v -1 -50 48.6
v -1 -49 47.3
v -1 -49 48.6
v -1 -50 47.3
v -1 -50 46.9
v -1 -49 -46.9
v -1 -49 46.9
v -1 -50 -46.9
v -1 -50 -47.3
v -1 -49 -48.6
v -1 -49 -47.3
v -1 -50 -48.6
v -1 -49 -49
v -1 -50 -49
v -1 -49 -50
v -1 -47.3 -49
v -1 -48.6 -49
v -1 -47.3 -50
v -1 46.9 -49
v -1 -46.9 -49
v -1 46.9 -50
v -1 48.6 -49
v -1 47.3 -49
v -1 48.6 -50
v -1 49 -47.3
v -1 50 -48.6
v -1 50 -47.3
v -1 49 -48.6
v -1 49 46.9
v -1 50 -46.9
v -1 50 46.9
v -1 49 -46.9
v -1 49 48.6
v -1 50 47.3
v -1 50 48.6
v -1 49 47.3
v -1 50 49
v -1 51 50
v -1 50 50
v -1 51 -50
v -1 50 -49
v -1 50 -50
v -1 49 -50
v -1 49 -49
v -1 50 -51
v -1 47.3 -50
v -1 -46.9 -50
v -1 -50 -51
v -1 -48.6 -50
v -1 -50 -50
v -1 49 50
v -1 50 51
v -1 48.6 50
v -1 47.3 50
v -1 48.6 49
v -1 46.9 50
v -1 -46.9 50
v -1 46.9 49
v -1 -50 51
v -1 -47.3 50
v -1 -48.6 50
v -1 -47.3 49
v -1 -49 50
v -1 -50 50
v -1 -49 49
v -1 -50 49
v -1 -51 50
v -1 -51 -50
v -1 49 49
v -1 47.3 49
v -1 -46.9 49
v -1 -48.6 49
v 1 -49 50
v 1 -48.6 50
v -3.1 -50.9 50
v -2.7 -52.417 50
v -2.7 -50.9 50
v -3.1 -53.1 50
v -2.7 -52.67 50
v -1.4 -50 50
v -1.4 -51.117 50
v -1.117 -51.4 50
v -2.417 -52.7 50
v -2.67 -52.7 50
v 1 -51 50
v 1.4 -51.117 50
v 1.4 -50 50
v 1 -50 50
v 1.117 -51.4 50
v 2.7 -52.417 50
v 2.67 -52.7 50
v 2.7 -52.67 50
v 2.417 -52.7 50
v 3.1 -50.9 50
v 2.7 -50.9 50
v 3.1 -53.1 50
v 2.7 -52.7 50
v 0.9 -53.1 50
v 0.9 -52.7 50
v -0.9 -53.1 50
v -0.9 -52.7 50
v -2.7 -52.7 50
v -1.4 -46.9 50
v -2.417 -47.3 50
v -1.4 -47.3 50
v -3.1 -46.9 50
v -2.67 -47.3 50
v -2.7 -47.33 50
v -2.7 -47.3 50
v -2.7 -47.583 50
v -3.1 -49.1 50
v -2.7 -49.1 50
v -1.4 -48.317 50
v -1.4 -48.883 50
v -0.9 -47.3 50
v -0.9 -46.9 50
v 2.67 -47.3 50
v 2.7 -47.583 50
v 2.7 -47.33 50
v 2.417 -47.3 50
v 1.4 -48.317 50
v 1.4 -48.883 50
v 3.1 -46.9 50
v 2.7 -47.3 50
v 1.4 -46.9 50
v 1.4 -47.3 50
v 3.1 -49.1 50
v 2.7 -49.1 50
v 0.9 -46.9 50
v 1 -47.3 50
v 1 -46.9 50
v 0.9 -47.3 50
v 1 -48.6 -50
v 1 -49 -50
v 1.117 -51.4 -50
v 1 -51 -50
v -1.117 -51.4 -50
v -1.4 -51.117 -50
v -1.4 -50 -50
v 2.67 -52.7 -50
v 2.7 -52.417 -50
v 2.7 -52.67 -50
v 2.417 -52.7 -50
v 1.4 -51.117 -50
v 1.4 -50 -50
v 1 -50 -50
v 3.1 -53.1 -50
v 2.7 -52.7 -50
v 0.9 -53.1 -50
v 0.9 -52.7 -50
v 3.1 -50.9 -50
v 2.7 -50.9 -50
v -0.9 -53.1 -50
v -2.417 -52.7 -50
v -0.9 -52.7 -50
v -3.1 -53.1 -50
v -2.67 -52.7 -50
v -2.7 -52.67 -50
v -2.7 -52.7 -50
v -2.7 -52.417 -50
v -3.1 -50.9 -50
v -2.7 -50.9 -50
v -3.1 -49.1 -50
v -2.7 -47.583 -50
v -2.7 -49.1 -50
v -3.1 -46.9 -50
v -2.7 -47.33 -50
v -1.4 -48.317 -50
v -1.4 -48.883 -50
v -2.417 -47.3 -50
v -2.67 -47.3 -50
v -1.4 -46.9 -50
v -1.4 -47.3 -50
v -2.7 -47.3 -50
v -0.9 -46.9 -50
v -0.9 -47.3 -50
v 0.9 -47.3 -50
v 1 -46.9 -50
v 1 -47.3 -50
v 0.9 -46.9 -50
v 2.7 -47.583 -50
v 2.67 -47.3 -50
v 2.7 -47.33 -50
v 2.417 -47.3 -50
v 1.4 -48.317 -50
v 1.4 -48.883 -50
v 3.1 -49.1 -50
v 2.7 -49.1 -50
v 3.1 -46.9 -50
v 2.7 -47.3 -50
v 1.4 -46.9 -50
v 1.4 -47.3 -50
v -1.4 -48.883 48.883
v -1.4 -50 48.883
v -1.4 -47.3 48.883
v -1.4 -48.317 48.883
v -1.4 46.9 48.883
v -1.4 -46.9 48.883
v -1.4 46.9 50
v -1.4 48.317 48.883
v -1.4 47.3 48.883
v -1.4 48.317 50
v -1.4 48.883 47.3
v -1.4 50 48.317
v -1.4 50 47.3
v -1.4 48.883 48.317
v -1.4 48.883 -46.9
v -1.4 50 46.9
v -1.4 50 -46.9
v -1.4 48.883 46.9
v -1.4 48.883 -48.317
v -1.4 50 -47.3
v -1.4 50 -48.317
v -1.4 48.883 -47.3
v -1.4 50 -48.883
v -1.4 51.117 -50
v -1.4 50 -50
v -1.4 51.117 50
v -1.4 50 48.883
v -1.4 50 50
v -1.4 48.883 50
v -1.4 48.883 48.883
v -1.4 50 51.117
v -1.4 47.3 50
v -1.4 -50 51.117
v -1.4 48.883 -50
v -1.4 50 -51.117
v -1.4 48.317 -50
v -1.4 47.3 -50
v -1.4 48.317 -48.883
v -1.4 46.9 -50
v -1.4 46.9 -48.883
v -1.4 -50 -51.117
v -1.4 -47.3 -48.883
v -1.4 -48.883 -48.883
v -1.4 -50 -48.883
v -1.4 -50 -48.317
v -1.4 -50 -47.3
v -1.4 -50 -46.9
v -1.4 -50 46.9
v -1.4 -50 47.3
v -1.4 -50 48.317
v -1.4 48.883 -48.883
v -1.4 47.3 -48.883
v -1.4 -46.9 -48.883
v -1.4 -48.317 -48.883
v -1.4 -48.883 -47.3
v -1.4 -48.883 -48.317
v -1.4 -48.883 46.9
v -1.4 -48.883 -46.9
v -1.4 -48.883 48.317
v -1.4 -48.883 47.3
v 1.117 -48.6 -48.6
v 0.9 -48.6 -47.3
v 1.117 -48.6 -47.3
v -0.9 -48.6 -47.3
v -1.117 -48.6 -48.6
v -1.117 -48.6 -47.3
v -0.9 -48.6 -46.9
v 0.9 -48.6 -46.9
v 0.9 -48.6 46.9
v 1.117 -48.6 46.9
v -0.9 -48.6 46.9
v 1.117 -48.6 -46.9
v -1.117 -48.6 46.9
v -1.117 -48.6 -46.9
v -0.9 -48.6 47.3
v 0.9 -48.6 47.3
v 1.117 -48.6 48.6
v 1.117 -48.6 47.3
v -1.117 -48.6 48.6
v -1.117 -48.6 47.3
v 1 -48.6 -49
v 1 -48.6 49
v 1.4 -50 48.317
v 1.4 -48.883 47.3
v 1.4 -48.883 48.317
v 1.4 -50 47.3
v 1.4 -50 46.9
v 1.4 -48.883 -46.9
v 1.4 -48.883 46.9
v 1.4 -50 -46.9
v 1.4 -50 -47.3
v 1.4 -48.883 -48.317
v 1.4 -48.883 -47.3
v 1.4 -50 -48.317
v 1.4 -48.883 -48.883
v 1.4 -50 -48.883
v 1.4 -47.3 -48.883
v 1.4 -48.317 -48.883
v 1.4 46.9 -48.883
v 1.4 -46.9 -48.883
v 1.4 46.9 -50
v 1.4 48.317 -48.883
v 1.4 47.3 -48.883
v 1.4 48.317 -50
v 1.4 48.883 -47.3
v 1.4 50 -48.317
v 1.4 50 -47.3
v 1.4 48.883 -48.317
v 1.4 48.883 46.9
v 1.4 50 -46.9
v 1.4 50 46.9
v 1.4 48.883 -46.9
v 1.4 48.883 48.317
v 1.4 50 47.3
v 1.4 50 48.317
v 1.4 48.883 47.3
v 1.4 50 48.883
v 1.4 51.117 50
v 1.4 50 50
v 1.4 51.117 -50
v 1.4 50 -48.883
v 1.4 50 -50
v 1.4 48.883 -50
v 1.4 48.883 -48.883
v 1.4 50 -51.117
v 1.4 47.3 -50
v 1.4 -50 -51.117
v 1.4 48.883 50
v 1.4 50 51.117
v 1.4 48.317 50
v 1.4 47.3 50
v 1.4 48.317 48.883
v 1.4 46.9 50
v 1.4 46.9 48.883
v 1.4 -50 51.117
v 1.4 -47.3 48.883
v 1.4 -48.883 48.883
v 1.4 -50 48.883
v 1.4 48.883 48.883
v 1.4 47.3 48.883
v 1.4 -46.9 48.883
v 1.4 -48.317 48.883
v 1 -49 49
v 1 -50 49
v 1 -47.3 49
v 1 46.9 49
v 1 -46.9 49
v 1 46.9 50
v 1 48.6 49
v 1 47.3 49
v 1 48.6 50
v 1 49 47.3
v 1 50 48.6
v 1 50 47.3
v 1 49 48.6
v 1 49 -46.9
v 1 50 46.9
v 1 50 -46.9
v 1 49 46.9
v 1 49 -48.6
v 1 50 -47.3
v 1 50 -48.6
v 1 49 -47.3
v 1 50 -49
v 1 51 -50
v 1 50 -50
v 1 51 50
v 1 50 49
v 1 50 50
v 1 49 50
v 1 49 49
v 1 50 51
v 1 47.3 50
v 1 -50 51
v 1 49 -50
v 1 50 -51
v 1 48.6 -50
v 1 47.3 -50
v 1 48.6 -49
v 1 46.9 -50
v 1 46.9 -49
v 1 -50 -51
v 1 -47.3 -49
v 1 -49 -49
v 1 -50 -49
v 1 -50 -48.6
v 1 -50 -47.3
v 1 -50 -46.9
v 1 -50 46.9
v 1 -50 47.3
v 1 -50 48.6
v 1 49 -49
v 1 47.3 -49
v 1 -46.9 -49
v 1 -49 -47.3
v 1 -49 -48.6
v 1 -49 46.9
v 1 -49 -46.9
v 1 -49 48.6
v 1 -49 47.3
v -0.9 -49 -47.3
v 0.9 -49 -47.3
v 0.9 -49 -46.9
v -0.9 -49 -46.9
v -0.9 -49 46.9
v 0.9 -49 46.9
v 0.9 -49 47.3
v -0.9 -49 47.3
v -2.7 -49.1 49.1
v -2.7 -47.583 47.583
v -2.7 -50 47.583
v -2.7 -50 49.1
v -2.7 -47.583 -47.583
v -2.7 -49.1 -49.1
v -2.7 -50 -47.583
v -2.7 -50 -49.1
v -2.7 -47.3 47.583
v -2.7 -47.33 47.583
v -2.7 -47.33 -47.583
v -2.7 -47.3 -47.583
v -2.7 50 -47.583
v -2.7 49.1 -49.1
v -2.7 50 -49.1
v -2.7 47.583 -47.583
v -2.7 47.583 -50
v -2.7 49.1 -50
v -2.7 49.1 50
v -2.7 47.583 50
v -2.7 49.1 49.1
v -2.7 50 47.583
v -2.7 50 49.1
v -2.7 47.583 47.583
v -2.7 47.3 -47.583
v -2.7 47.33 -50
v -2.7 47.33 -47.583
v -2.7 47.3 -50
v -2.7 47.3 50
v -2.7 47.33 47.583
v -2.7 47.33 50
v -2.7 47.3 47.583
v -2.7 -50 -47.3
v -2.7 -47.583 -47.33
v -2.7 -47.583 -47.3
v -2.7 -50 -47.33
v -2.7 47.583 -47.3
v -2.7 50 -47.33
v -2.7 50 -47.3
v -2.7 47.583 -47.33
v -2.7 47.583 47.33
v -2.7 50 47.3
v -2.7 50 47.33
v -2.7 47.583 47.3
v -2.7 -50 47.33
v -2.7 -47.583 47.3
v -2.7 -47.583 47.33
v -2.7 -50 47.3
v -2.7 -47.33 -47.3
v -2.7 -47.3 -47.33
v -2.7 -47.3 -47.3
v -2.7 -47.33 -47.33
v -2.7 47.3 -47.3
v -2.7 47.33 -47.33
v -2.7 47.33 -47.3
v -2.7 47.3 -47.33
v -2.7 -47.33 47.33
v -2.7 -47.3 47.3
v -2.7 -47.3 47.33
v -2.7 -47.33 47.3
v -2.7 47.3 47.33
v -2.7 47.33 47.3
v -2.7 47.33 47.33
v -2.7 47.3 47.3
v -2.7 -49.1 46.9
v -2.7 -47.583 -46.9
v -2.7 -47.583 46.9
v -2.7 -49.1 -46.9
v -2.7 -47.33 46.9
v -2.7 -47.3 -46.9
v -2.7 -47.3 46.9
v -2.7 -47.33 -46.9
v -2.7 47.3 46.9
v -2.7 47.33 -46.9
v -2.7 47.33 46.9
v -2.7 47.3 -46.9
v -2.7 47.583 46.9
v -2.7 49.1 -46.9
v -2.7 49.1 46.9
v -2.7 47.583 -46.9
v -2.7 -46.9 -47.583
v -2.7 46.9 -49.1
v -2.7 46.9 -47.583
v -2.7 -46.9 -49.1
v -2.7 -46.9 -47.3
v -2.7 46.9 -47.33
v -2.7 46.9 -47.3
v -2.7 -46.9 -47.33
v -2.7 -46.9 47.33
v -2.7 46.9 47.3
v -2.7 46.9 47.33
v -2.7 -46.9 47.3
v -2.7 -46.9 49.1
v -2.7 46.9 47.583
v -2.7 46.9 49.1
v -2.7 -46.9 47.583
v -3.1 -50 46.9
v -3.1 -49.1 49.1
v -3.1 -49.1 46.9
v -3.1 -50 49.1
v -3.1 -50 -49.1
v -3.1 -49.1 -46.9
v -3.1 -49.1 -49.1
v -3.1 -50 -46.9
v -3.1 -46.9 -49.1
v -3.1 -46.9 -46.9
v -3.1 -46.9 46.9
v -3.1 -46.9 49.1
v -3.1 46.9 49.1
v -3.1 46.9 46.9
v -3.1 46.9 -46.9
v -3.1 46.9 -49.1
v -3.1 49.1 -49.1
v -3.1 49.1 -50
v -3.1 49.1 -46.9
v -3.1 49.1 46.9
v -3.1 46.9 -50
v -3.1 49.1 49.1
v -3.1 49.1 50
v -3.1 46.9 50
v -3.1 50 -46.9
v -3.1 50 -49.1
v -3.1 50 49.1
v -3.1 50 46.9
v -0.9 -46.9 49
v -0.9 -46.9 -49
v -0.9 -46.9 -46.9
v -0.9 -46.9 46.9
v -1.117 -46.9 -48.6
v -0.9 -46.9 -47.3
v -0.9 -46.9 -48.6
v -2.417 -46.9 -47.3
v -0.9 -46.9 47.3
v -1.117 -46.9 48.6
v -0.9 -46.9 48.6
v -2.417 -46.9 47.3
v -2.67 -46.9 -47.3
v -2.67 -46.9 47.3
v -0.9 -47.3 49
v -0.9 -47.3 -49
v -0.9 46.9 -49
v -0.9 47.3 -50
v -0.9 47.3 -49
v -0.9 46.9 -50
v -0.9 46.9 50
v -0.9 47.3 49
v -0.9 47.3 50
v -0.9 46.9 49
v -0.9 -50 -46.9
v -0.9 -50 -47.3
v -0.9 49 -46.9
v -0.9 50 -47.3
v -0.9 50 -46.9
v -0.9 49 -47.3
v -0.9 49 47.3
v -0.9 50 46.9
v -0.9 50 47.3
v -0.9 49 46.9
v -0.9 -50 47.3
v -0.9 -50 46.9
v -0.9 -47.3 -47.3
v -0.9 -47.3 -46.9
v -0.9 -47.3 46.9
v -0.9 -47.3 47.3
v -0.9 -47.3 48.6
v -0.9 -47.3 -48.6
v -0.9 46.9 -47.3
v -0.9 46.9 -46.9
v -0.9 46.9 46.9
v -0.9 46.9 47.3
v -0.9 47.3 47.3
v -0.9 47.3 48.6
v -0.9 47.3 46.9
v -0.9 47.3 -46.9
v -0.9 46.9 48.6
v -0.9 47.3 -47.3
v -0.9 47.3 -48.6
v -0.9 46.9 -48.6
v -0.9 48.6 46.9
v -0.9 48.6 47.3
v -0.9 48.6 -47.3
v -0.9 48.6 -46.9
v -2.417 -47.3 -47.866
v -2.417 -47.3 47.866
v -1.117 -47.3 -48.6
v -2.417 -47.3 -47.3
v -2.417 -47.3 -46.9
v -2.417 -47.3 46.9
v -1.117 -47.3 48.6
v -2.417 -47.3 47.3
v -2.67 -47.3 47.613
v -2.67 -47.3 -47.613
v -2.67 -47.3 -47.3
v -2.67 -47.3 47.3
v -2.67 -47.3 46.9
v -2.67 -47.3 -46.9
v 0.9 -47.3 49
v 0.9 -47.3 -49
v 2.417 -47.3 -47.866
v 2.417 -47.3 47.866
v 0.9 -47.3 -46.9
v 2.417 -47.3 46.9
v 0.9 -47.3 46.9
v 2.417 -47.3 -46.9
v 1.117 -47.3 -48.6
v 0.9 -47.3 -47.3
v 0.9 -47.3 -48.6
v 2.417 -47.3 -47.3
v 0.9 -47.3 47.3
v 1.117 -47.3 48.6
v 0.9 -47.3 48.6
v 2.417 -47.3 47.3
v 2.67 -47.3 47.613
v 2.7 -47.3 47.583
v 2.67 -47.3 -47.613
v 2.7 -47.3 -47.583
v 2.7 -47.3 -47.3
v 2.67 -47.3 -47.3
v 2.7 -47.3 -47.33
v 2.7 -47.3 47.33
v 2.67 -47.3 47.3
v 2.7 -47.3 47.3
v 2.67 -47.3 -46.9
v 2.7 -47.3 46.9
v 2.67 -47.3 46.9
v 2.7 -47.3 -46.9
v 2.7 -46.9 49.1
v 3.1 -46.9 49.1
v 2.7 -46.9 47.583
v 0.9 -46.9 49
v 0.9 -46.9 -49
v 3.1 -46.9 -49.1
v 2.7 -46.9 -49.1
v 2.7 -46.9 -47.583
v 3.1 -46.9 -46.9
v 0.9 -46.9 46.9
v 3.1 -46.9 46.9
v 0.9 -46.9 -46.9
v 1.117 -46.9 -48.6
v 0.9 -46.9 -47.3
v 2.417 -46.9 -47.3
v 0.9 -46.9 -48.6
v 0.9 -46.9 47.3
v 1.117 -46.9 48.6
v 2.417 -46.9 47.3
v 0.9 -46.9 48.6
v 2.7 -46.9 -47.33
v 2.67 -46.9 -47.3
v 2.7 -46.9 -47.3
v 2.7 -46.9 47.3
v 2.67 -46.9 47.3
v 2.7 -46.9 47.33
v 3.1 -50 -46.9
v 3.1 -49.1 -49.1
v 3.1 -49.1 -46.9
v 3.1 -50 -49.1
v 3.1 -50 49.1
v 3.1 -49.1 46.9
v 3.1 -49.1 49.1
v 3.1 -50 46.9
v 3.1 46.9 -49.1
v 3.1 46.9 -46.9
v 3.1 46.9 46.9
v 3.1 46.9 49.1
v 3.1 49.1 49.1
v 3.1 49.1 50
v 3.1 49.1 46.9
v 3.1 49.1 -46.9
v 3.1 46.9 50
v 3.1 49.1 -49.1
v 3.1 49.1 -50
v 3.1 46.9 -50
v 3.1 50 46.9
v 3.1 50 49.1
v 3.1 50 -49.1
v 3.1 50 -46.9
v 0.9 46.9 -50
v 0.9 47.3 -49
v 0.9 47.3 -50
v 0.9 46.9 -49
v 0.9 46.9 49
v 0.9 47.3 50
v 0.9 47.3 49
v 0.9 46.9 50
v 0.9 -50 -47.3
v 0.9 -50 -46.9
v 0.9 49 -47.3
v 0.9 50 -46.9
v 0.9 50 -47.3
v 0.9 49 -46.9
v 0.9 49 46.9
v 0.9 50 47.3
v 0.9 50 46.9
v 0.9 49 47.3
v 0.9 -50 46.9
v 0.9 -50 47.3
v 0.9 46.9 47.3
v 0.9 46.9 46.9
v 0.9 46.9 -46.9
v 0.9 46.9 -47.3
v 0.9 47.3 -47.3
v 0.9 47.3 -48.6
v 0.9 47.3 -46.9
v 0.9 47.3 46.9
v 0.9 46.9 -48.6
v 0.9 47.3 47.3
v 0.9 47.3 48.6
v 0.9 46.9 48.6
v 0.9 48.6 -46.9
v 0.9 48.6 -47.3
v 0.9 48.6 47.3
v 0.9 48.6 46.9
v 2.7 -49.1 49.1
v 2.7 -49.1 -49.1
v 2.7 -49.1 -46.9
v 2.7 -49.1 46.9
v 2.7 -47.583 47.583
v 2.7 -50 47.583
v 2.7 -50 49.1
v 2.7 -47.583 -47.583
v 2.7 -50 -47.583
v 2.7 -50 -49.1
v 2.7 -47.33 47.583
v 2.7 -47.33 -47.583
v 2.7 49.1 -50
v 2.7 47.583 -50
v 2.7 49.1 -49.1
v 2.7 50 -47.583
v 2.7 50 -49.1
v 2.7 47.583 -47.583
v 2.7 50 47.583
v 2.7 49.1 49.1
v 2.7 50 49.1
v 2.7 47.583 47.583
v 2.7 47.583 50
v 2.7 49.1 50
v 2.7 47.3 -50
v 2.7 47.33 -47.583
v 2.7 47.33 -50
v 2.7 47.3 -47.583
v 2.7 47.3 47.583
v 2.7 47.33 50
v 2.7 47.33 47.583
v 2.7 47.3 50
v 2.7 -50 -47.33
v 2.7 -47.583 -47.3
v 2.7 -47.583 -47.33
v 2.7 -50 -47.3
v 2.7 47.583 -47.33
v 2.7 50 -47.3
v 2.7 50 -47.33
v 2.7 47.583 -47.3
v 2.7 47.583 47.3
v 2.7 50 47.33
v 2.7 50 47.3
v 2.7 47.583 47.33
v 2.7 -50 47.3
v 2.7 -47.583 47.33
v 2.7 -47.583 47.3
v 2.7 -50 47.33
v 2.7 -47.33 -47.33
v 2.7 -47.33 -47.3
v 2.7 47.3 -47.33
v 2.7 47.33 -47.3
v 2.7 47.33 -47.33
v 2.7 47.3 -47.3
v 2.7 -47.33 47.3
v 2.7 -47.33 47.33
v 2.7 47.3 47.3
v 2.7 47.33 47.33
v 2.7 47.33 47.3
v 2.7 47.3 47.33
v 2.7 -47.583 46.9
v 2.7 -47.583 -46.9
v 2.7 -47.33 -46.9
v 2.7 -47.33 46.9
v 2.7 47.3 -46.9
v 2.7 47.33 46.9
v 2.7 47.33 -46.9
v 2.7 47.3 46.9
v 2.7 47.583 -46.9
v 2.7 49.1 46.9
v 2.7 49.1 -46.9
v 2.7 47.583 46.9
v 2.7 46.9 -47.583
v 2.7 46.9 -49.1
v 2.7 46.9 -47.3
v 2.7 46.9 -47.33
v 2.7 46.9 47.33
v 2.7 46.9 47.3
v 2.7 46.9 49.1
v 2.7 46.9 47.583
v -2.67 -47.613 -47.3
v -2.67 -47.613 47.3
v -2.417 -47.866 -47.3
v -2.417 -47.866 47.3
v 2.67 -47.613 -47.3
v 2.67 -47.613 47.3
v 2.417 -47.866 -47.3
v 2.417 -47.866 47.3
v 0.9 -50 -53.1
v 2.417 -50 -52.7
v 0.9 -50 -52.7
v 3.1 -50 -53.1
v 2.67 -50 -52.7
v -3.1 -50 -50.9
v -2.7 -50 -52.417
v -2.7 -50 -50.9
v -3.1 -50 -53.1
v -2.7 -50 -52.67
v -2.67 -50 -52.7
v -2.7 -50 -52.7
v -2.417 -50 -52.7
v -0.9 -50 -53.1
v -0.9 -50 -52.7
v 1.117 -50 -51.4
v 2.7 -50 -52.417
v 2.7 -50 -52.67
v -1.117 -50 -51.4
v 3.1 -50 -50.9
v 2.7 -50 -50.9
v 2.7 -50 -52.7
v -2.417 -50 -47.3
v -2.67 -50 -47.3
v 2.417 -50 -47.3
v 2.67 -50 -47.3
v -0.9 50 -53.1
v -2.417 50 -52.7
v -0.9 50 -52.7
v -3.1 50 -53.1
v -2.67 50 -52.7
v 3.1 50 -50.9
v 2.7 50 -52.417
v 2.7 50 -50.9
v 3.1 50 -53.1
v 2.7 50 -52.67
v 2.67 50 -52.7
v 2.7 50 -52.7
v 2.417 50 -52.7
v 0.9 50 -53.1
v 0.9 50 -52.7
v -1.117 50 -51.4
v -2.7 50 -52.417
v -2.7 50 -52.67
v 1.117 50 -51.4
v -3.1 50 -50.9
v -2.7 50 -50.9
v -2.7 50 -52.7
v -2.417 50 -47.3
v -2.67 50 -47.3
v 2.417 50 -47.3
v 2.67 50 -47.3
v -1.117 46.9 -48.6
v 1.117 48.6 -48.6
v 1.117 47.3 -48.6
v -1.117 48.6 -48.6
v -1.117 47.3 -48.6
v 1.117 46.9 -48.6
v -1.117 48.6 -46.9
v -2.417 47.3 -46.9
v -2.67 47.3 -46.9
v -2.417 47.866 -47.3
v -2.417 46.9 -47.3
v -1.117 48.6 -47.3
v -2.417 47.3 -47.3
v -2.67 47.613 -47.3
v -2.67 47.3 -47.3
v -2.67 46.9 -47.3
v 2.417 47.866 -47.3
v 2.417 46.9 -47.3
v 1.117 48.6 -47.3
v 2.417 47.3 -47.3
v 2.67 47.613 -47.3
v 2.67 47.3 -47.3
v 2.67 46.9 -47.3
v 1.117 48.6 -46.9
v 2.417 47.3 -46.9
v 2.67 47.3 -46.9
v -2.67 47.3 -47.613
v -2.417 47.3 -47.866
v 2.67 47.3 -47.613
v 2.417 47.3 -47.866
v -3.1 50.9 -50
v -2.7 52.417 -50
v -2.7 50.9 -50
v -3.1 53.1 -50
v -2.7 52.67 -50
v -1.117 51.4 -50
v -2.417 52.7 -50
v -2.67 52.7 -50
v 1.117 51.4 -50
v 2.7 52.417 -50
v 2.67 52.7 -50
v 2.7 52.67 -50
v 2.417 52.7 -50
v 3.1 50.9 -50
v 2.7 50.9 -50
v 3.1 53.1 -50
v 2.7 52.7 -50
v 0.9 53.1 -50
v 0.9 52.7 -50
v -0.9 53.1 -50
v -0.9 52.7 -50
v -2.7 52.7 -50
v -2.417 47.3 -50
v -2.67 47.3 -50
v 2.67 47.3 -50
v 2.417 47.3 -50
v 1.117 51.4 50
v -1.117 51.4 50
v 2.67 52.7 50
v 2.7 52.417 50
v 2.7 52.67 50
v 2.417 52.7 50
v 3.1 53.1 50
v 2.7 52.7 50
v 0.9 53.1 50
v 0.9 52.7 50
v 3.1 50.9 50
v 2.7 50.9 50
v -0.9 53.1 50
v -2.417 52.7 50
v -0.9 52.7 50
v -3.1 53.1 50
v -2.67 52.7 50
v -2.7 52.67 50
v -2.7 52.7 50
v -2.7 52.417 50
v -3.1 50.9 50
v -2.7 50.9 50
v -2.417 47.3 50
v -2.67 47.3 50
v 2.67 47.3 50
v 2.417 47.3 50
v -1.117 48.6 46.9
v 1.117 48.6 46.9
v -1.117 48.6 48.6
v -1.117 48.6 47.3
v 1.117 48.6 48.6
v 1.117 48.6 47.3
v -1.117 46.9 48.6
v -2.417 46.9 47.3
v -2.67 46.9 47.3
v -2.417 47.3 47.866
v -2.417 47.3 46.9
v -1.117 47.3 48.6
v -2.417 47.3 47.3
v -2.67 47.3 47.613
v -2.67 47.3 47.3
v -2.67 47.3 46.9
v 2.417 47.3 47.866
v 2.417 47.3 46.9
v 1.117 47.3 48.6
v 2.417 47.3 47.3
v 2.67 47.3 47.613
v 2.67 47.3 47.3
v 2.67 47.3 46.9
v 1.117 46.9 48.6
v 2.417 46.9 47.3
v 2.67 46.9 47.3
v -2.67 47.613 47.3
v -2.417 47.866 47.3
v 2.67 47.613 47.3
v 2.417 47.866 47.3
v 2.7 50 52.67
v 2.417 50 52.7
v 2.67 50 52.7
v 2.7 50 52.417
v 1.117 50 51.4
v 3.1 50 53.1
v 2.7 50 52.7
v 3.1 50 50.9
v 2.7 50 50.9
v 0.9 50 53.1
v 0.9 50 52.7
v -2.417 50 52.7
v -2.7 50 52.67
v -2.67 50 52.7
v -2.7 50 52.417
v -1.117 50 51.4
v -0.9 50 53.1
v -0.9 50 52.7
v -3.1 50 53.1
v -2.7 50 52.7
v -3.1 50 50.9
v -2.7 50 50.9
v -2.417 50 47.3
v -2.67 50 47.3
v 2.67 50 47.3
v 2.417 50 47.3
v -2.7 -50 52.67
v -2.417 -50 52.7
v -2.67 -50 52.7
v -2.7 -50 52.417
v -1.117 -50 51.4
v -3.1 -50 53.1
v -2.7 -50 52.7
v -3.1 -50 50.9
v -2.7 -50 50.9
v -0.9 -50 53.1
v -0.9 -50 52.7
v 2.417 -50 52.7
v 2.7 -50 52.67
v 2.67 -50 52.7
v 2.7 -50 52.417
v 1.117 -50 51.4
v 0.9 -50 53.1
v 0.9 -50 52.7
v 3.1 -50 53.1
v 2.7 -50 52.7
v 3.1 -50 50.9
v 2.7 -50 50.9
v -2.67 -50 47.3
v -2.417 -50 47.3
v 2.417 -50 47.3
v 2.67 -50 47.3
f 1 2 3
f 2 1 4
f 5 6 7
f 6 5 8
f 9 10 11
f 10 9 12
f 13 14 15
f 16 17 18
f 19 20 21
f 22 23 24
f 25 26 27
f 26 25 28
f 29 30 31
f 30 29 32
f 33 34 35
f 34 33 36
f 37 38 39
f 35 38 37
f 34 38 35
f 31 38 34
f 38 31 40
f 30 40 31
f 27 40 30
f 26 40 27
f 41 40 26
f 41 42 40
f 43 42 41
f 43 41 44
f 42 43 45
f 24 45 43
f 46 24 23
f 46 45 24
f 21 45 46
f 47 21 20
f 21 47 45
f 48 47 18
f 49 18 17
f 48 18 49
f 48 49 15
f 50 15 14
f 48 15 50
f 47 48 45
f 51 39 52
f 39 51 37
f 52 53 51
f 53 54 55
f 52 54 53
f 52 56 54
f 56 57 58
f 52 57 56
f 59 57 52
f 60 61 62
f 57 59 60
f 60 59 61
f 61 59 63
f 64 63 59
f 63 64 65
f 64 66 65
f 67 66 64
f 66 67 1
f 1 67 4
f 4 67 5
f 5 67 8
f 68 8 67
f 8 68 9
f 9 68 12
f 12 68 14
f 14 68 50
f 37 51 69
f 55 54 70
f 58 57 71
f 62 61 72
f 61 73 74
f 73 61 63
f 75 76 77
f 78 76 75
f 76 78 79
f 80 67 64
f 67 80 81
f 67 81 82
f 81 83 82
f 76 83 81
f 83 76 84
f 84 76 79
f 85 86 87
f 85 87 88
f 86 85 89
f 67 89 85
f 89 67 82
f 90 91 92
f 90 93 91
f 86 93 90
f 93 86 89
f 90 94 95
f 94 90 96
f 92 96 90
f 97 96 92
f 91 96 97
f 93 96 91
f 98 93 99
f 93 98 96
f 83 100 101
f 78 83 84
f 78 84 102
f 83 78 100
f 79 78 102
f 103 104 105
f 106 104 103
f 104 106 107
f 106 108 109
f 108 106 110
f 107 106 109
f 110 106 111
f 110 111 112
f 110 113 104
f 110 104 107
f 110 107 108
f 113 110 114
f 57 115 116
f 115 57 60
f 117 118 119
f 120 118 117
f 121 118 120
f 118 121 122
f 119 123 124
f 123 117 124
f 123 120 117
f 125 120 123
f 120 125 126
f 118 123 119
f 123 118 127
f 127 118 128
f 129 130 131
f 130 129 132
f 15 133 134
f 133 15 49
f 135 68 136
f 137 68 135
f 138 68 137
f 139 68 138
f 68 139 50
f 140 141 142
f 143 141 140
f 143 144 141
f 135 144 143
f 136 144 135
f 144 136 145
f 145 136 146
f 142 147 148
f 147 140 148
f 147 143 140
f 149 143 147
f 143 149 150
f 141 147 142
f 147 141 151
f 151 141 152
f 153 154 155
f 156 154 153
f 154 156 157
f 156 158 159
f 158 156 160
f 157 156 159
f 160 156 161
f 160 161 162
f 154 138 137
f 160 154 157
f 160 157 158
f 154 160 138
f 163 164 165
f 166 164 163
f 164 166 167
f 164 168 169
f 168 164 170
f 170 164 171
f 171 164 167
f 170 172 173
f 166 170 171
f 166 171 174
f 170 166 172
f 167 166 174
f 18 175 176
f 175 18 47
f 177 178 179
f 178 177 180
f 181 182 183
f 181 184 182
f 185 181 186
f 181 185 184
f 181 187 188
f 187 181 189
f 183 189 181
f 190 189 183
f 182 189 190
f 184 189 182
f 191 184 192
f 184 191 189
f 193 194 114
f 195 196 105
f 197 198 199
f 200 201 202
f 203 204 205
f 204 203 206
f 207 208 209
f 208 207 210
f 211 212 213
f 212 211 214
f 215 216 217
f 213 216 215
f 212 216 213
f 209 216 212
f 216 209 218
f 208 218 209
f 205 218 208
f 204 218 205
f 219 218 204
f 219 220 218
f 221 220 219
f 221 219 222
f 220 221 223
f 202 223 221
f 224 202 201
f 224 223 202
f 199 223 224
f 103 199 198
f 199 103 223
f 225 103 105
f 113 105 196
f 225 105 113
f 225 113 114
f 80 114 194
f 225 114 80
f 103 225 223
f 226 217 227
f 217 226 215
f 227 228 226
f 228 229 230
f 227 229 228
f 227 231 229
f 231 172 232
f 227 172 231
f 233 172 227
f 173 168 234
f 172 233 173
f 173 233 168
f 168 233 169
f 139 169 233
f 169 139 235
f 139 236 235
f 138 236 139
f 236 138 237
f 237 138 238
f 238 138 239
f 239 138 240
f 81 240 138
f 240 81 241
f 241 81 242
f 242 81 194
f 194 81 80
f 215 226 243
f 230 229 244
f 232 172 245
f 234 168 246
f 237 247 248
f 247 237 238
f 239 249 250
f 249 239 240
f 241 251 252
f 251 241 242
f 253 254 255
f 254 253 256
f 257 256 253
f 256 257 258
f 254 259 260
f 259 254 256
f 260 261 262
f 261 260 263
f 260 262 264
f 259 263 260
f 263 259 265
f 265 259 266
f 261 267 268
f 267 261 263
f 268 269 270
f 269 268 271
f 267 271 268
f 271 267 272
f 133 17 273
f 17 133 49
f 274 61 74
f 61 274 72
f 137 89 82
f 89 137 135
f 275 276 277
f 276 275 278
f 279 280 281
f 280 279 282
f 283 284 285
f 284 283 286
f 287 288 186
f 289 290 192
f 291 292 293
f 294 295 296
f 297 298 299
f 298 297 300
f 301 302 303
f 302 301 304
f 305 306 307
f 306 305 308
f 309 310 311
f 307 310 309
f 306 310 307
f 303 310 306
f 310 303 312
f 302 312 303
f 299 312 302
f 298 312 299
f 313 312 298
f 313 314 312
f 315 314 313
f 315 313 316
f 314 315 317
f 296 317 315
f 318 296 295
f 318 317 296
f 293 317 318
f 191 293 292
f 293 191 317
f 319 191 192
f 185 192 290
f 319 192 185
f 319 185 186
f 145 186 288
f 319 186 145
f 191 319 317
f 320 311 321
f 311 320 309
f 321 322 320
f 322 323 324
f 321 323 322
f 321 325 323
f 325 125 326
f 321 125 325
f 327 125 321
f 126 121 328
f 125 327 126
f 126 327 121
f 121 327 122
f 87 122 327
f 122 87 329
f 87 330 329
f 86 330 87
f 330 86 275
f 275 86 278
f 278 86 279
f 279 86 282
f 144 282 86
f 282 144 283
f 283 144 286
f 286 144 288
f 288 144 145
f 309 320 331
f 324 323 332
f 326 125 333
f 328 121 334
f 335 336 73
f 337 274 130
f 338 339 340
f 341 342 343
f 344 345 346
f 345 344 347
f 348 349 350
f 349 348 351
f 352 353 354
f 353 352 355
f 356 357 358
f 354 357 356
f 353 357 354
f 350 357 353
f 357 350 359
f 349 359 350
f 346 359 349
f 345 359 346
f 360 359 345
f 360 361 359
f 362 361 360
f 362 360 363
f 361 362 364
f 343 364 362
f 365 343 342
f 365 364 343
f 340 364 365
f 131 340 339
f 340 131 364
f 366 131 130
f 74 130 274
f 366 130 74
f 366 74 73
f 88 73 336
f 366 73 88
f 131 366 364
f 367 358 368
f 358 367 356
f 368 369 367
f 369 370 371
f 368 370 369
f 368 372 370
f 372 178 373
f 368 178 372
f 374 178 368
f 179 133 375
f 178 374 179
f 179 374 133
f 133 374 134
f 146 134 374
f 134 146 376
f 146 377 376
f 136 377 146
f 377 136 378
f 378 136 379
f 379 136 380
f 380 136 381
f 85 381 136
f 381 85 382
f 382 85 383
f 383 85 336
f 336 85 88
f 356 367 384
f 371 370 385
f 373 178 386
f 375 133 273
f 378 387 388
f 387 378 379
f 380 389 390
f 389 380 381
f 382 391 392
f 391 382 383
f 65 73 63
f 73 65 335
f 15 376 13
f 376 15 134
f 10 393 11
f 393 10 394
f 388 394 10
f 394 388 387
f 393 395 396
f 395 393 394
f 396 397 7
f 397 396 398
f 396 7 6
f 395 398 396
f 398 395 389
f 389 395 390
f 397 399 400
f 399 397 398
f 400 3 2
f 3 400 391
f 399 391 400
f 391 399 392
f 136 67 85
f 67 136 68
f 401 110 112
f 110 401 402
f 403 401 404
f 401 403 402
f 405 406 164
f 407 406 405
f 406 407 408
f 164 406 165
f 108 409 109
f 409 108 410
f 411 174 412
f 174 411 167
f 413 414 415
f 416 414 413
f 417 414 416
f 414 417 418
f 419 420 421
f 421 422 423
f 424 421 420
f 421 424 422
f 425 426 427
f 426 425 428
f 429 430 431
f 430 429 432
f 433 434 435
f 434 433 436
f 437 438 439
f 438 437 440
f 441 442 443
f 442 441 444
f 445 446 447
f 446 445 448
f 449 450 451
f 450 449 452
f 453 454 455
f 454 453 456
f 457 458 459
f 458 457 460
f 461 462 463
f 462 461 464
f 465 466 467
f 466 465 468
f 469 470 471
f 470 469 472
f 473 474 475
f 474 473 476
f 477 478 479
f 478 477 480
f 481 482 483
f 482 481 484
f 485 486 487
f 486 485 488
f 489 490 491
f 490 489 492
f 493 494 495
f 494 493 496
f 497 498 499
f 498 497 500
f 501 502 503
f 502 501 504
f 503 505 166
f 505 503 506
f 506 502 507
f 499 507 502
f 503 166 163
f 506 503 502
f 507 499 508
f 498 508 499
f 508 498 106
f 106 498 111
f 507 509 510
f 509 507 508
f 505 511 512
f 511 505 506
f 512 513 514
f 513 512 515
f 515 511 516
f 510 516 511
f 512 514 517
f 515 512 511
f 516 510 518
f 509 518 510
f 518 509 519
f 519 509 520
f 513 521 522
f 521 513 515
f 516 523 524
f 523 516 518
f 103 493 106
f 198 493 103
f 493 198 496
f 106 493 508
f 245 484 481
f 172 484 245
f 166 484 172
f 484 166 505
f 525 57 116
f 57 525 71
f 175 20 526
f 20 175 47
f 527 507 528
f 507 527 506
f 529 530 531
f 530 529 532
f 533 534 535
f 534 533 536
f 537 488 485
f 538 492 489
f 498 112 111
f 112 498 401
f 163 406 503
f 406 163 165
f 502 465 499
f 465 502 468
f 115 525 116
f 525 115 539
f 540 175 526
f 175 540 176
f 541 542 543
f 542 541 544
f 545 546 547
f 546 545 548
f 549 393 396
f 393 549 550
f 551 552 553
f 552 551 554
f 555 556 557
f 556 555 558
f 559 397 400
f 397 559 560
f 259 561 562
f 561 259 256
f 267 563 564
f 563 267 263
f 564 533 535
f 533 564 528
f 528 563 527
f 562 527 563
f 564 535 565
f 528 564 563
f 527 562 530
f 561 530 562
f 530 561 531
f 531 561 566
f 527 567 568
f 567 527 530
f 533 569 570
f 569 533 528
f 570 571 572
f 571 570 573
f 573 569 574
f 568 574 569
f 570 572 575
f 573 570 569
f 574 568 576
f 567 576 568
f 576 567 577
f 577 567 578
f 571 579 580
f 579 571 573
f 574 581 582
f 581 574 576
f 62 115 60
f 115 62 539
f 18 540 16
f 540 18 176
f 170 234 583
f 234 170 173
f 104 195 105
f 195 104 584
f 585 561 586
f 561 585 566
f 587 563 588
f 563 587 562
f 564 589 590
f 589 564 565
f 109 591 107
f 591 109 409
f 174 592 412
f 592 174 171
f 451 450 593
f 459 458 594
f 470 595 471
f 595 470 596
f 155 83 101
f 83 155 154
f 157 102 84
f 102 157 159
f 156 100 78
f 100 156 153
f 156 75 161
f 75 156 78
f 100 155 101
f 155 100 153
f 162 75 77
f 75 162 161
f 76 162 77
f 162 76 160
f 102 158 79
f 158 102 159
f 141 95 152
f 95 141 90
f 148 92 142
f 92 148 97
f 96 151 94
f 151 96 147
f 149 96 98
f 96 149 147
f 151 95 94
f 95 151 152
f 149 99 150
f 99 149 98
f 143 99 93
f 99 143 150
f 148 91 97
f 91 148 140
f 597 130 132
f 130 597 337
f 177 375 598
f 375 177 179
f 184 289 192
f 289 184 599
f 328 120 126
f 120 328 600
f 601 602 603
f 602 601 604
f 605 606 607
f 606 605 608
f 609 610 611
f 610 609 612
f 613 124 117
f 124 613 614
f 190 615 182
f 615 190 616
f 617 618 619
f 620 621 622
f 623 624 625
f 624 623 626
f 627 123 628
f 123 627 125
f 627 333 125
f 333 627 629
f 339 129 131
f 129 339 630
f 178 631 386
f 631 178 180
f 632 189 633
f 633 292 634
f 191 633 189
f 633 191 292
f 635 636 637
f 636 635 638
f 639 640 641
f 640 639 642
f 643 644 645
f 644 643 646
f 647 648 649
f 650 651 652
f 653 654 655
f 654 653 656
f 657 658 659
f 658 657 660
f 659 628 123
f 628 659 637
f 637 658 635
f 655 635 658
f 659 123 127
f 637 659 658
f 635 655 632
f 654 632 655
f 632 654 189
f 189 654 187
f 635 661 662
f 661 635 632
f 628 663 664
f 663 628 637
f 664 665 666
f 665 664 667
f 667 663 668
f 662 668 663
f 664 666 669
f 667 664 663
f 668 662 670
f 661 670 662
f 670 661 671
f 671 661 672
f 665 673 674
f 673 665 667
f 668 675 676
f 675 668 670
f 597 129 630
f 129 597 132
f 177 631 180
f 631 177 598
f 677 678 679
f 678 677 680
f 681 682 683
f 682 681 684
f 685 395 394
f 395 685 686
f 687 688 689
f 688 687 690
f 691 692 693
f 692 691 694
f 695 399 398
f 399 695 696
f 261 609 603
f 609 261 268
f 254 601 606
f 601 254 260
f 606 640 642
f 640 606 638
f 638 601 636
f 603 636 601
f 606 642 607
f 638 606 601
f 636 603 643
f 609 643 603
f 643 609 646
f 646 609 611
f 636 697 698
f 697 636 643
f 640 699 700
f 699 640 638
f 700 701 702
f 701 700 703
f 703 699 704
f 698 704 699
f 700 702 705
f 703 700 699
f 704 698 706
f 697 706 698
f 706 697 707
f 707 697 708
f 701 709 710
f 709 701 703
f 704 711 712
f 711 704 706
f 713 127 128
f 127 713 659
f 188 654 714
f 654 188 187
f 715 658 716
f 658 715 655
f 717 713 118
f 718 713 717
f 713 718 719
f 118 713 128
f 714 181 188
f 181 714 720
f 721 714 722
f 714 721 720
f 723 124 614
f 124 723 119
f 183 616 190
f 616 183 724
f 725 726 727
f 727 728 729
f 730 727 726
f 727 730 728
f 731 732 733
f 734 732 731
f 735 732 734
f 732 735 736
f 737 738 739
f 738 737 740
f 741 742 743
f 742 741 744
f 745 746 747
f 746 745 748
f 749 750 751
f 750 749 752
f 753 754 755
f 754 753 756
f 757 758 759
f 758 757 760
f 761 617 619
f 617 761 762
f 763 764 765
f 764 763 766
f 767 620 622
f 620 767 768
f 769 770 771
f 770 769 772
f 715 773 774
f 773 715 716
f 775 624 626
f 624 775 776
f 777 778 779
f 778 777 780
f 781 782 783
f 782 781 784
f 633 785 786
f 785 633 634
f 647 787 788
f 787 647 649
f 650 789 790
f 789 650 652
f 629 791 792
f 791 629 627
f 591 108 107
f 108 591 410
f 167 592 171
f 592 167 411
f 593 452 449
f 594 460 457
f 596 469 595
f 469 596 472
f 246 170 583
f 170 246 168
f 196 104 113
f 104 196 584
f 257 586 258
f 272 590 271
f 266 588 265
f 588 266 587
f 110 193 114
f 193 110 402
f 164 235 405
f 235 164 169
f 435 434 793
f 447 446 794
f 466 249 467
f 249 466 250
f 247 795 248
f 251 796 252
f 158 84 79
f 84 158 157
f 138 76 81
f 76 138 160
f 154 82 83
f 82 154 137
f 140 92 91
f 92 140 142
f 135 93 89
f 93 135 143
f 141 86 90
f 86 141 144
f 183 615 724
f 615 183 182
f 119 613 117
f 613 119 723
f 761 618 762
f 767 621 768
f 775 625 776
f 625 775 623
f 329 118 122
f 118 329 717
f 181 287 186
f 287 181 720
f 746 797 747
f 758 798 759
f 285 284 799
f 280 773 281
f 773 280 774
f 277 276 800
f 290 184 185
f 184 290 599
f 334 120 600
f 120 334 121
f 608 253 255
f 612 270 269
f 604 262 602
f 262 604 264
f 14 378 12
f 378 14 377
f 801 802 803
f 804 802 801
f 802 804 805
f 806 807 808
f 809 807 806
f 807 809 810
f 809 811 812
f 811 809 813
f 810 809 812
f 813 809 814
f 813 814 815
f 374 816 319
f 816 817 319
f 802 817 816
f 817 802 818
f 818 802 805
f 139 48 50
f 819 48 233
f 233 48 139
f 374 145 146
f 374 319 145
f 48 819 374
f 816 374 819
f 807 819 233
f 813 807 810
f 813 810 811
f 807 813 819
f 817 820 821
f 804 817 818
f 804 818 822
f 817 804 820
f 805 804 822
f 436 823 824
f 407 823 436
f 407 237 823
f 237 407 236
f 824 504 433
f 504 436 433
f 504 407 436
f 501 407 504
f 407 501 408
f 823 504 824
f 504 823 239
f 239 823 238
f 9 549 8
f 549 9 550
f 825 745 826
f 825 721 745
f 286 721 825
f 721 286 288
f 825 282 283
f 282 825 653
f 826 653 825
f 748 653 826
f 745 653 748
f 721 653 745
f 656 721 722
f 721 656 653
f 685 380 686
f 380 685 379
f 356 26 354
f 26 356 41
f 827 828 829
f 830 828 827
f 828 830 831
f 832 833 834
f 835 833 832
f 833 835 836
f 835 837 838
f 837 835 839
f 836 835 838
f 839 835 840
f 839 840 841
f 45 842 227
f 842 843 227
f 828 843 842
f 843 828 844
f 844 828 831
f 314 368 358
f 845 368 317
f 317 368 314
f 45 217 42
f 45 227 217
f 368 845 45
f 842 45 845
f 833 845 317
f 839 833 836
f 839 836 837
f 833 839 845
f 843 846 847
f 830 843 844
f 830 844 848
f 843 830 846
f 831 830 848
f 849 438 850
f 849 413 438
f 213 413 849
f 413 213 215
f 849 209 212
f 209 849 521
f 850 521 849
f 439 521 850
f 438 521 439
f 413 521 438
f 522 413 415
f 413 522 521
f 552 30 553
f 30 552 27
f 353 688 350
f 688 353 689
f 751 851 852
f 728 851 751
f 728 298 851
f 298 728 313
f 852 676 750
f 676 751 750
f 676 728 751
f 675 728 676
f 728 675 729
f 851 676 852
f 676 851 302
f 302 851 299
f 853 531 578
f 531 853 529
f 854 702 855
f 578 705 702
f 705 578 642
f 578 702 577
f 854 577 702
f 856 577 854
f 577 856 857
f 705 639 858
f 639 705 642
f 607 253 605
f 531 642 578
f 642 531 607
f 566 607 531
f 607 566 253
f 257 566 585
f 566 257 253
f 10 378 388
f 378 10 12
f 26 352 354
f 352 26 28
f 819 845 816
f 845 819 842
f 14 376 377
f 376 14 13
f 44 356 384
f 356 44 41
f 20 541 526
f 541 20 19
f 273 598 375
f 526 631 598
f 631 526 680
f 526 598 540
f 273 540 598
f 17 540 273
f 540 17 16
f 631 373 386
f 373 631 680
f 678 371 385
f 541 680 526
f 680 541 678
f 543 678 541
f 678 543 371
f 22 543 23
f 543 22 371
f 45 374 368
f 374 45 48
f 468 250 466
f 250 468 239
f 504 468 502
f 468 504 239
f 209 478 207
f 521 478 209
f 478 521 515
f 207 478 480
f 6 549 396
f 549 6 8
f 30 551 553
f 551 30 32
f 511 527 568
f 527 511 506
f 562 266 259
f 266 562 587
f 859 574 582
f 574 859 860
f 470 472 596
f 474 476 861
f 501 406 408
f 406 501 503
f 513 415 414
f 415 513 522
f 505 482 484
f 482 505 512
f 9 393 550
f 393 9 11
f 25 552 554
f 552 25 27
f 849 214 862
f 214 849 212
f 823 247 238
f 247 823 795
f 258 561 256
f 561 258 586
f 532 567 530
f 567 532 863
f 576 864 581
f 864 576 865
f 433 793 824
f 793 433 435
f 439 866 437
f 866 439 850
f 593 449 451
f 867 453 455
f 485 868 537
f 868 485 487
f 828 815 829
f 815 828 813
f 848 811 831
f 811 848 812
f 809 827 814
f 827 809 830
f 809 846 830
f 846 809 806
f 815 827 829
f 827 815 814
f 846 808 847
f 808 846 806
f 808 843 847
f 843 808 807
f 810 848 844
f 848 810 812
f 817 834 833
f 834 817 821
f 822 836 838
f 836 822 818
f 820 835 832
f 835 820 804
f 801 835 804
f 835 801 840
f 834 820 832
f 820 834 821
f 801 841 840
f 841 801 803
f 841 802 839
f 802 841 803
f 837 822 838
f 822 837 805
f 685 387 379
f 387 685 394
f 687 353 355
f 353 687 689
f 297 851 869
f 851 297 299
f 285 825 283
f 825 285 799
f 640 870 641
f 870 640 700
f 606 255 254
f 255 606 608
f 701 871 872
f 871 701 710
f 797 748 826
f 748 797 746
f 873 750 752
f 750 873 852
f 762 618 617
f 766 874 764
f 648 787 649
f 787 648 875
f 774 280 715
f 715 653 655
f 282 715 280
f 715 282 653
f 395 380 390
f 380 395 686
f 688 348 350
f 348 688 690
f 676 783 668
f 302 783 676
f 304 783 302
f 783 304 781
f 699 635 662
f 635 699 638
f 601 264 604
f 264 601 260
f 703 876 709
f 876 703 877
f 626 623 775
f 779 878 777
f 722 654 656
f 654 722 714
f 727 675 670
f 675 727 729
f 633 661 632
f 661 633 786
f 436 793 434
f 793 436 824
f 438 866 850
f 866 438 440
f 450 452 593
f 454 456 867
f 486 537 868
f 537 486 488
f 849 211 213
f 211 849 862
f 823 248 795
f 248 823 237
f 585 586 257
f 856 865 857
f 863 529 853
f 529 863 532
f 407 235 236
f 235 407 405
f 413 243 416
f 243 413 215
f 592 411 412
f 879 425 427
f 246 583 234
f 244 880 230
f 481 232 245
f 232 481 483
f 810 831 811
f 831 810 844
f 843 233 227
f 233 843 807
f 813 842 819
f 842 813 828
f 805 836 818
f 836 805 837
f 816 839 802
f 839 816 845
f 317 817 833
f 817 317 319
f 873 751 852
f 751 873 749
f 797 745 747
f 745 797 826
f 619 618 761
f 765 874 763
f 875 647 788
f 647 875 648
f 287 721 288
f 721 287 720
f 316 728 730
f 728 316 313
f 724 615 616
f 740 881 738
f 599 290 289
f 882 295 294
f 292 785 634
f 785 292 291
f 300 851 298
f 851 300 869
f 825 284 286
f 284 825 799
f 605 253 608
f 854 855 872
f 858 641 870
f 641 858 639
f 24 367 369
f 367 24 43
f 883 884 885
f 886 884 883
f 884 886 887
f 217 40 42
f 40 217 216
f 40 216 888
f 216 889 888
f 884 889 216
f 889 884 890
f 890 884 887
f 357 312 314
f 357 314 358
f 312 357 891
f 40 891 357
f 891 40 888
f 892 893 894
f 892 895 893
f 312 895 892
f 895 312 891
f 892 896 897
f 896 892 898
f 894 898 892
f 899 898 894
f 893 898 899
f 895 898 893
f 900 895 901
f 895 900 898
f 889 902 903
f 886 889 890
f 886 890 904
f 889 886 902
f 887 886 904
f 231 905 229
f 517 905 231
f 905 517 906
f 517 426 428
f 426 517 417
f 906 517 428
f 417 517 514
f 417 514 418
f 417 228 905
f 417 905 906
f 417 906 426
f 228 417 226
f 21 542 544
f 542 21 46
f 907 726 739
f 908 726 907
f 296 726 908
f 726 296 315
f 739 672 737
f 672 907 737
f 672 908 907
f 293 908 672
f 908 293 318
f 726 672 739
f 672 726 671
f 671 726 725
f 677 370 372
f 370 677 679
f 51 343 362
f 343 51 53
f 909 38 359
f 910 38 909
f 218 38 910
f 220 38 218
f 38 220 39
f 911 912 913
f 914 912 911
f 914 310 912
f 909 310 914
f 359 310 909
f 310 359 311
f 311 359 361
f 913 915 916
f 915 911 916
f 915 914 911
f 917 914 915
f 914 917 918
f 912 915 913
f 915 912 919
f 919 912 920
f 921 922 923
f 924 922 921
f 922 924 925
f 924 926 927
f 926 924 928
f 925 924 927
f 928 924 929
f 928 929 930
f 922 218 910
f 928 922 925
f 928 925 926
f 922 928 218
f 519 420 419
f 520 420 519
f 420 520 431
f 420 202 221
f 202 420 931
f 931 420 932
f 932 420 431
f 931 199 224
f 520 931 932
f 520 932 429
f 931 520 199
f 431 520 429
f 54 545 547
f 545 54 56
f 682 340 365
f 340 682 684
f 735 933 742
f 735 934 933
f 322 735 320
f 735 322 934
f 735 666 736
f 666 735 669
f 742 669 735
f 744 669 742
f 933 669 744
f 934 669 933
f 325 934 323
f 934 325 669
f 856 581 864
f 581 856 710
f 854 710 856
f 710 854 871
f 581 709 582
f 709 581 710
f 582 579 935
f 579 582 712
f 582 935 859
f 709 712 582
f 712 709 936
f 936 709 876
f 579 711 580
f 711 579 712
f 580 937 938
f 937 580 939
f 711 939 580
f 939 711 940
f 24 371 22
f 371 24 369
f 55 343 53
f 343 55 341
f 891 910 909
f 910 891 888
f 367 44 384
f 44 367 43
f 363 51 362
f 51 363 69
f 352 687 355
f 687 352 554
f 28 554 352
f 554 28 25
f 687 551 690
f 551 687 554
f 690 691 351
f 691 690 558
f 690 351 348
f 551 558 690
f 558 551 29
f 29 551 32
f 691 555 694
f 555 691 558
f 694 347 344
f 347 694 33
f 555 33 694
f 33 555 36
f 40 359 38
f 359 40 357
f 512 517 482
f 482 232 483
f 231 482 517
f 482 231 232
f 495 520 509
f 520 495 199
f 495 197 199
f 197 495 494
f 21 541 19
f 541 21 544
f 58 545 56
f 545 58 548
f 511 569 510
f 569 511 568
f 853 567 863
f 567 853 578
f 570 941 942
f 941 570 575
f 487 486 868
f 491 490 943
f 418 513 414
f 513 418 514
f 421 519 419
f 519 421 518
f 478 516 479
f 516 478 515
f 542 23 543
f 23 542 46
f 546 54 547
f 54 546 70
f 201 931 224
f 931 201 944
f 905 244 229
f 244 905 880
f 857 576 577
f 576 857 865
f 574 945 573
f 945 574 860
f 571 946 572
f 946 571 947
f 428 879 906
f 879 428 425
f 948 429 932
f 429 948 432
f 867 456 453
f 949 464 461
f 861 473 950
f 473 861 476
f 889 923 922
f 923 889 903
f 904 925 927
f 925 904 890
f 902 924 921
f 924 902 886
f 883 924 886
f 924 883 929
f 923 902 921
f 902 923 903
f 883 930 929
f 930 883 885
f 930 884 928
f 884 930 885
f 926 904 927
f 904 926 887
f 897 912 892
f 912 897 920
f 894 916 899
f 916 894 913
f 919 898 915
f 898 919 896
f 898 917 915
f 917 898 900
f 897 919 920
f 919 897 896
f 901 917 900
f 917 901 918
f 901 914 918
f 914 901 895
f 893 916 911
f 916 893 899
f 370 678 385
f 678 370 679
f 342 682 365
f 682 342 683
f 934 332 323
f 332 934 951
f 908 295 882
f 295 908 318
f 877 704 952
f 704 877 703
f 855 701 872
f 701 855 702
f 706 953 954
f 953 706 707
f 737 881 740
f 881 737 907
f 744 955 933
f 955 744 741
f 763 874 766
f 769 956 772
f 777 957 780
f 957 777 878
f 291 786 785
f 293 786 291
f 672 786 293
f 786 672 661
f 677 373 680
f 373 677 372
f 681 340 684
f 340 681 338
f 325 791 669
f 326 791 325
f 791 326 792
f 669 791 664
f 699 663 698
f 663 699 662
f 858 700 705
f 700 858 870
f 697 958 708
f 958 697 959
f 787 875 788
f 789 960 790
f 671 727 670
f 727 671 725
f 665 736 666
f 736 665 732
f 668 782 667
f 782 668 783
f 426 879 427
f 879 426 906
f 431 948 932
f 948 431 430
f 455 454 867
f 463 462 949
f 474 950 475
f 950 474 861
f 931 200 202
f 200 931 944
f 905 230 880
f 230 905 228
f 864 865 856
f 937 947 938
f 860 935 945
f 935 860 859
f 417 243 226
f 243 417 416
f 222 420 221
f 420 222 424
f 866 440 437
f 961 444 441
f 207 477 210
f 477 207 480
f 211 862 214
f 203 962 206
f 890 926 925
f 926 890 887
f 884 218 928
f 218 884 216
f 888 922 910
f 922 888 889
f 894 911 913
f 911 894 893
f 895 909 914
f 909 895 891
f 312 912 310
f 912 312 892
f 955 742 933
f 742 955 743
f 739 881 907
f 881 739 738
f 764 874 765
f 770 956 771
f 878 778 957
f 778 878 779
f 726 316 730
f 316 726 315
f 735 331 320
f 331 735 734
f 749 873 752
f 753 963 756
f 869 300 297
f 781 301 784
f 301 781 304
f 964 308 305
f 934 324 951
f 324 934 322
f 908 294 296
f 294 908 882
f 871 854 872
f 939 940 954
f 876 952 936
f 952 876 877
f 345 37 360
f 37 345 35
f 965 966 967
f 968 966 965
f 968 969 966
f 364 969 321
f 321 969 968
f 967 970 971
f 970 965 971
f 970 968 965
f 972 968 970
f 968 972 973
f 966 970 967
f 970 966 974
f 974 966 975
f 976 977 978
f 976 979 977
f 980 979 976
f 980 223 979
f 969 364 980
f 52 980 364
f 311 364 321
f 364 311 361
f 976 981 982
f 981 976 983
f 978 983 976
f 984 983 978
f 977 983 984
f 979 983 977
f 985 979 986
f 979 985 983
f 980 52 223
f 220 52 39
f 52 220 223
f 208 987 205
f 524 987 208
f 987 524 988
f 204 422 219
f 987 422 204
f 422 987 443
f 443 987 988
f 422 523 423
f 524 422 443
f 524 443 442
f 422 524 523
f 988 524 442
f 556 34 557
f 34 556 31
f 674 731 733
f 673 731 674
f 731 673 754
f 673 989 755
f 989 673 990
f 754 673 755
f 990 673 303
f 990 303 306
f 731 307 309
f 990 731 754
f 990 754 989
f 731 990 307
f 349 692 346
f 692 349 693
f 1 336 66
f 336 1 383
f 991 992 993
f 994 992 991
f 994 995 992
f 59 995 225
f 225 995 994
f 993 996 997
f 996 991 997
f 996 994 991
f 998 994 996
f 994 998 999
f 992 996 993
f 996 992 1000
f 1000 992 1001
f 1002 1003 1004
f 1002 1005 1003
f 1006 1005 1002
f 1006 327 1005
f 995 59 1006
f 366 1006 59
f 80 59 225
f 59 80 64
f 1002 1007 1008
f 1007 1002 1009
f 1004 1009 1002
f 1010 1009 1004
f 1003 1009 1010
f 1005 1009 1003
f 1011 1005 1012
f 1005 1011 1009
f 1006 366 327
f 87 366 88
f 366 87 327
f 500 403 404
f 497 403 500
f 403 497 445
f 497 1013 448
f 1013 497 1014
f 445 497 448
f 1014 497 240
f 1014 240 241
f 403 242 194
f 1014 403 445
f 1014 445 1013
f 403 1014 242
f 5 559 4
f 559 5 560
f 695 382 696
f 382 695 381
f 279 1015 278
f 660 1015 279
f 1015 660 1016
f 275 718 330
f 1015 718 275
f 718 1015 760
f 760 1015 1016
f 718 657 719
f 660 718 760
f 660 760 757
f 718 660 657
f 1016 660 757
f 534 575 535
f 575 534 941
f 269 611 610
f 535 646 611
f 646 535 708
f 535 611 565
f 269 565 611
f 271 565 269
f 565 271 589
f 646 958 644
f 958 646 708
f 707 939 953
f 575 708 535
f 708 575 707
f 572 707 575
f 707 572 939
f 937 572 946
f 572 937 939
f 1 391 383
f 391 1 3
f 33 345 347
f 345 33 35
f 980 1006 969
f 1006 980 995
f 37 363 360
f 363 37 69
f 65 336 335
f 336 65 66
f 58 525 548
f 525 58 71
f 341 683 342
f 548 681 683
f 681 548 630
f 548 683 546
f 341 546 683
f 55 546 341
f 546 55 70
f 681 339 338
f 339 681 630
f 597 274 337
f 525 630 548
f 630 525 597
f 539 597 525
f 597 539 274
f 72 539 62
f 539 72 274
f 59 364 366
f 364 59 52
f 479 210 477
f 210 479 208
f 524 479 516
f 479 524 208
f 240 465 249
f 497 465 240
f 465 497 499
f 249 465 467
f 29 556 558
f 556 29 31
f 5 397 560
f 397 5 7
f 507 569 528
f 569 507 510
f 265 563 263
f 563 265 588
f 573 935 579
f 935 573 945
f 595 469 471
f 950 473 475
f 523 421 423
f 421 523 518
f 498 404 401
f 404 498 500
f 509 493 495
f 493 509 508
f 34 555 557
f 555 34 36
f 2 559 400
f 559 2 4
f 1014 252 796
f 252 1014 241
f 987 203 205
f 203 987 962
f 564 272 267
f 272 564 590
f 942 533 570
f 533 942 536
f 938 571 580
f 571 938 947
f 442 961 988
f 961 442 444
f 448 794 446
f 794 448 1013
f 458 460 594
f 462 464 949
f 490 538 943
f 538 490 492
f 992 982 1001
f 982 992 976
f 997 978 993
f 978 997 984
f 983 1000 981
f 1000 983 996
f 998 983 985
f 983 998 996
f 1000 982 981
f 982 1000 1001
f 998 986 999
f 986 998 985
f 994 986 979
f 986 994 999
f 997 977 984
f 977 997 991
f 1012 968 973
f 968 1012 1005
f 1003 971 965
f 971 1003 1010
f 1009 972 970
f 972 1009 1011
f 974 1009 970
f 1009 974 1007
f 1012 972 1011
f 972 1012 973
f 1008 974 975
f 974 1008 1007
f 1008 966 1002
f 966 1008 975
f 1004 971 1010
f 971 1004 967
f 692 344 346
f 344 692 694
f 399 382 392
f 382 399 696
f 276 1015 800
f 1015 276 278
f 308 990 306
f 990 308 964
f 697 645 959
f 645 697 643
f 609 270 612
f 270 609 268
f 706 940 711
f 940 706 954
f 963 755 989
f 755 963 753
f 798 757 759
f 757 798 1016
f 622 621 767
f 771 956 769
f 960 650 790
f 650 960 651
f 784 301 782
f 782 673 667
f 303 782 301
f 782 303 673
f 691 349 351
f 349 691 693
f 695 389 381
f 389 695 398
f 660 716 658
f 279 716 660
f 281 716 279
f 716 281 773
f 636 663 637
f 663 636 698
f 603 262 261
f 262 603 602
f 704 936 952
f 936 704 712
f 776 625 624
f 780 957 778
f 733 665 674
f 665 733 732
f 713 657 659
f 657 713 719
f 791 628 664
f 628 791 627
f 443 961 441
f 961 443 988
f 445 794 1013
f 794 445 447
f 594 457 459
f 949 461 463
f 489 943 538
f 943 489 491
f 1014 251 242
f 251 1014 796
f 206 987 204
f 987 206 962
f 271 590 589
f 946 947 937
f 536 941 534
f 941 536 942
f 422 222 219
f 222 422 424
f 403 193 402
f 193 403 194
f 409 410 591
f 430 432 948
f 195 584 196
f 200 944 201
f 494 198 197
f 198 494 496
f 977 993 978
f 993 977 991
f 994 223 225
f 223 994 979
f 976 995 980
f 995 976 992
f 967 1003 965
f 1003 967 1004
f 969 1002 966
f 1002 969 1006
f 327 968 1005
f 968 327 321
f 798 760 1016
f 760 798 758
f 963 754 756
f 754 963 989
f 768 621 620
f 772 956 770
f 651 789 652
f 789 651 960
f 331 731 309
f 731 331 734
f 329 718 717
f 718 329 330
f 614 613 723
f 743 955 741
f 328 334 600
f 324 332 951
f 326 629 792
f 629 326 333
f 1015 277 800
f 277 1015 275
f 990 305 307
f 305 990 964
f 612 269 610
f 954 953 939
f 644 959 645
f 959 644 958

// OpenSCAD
module PrSquare(length, width, al_th)
{
	inner_gap = width - (2*al_th);

	translate([-1-(inner_gap/2), 0, 0])cube([al_th, inner_gap+(al_th*2), length], center=true);
	translate([(inner_gap/2)+1, 0, 0])cube([al_th, inner_gap+(al_th*2), length], center=true);
	// top & bottom
	translate([0,(inner_gap/2)+1,0])cube([inner_gap, al_th, length], center=true);
	translate([0,-(inner_gap/2)-1,0])cube([inner_gap, al_th, length], center=true);
}

module PrL(length, width_top, width_side, al_th)
{
	//side
	translate([-(width_top/2)+(al_th/2),0,0])
		cube([al_th,width_side,length], center=true);
	//top
	translate([0,(width_side/2)-(al_th/2),0])
		cube([width_top,al_th,length], center=true);
}

module AlPrKombi(length)
{
	al_th = 2;
	profile_width = 30;
	side_gap = 8;
	inner_gap = 10;
	col = "Silver";
	// ----
	side_size = (profile_width-side_gap)/2;

	color(col)PrSquare(length, inner_gap+(2*al_th), al_th);
	
	for(angle = [0, 90, 180, 270])
	{
		rotate([0,0,angle])
		translate([-(inner_gap/2)-(al_th/2),(inner_gap/2)+(al_th/2),0])
		rotate([0,0,-45])
		translate([-inner_gap/2,0,0])
		color(col)
		cube([side_size,al_th,length], center=true);

		rotate([0,0,angle])
		translate([-(profile_width-inner_gap)/2,(profile_width-inner_gap)/2,0])
		color(col)
		PrL(length, side_size, side_size, al_th);
	}

}

sc = 0.2;
sq_size = 500;

for(angle = [0,90,180,270])
{
	scale(sc)
	rotate([angle,0,0])
	translate([0,-sq_size/2,0])
	AlPrKombi(sq_size);
}
